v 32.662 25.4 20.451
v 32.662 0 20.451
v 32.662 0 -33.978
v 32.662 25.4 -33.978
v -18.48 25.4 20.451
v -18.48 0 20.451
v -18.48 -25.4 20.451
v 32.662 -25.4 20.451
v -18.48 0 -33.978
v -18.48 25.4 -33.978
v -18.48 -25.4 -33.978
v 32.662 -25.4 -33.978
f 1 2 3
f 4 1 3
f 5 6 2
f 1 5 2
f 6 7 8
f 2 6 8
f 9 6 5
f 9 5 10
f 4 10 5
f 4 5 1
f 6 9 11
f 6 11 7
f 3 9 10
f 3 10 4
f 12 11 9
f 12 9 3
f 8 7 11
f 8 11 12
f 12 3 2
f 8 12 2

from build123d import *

# Parameters (mm, degrees)
F0_W      = 51.142089
F0_H      = 54.42879
F0_R      = 12.892962
F1_DEPTH  = 25.4
F1_FACE_W = 51.14209
F1_FACE_H = 54.42879
F2_DEPTH  = 25.4


with BuildPart() as f1:
    # F0 (on Front) → F1 (new body)
    with BuildSketch(Plane.XZ):
        with Locations((7.091131, -6.763158)):
            Rectangle(F0_W, F0_H)
        with Locations((5.157186, -4.527965)):
            Circle(F0_R, mode=Mode.SUBTRACT)
        with Locations((5.157186, -4.527965)):
            Circle(F0_R)
    extrude(amount=F1_DEPTH)

    # F1_face (on face) → F2 (join)
    with BuildSketch(Plane(origin=(7.091131, 0, -6.763158), x_dir=(1, 0, 0), z_dir=(0, 1, 0))):
        Rectangle(F1_FACE_W, F1_FACE_H)
    extrude(amount=F2_DEPTH)


solid = f1.part
